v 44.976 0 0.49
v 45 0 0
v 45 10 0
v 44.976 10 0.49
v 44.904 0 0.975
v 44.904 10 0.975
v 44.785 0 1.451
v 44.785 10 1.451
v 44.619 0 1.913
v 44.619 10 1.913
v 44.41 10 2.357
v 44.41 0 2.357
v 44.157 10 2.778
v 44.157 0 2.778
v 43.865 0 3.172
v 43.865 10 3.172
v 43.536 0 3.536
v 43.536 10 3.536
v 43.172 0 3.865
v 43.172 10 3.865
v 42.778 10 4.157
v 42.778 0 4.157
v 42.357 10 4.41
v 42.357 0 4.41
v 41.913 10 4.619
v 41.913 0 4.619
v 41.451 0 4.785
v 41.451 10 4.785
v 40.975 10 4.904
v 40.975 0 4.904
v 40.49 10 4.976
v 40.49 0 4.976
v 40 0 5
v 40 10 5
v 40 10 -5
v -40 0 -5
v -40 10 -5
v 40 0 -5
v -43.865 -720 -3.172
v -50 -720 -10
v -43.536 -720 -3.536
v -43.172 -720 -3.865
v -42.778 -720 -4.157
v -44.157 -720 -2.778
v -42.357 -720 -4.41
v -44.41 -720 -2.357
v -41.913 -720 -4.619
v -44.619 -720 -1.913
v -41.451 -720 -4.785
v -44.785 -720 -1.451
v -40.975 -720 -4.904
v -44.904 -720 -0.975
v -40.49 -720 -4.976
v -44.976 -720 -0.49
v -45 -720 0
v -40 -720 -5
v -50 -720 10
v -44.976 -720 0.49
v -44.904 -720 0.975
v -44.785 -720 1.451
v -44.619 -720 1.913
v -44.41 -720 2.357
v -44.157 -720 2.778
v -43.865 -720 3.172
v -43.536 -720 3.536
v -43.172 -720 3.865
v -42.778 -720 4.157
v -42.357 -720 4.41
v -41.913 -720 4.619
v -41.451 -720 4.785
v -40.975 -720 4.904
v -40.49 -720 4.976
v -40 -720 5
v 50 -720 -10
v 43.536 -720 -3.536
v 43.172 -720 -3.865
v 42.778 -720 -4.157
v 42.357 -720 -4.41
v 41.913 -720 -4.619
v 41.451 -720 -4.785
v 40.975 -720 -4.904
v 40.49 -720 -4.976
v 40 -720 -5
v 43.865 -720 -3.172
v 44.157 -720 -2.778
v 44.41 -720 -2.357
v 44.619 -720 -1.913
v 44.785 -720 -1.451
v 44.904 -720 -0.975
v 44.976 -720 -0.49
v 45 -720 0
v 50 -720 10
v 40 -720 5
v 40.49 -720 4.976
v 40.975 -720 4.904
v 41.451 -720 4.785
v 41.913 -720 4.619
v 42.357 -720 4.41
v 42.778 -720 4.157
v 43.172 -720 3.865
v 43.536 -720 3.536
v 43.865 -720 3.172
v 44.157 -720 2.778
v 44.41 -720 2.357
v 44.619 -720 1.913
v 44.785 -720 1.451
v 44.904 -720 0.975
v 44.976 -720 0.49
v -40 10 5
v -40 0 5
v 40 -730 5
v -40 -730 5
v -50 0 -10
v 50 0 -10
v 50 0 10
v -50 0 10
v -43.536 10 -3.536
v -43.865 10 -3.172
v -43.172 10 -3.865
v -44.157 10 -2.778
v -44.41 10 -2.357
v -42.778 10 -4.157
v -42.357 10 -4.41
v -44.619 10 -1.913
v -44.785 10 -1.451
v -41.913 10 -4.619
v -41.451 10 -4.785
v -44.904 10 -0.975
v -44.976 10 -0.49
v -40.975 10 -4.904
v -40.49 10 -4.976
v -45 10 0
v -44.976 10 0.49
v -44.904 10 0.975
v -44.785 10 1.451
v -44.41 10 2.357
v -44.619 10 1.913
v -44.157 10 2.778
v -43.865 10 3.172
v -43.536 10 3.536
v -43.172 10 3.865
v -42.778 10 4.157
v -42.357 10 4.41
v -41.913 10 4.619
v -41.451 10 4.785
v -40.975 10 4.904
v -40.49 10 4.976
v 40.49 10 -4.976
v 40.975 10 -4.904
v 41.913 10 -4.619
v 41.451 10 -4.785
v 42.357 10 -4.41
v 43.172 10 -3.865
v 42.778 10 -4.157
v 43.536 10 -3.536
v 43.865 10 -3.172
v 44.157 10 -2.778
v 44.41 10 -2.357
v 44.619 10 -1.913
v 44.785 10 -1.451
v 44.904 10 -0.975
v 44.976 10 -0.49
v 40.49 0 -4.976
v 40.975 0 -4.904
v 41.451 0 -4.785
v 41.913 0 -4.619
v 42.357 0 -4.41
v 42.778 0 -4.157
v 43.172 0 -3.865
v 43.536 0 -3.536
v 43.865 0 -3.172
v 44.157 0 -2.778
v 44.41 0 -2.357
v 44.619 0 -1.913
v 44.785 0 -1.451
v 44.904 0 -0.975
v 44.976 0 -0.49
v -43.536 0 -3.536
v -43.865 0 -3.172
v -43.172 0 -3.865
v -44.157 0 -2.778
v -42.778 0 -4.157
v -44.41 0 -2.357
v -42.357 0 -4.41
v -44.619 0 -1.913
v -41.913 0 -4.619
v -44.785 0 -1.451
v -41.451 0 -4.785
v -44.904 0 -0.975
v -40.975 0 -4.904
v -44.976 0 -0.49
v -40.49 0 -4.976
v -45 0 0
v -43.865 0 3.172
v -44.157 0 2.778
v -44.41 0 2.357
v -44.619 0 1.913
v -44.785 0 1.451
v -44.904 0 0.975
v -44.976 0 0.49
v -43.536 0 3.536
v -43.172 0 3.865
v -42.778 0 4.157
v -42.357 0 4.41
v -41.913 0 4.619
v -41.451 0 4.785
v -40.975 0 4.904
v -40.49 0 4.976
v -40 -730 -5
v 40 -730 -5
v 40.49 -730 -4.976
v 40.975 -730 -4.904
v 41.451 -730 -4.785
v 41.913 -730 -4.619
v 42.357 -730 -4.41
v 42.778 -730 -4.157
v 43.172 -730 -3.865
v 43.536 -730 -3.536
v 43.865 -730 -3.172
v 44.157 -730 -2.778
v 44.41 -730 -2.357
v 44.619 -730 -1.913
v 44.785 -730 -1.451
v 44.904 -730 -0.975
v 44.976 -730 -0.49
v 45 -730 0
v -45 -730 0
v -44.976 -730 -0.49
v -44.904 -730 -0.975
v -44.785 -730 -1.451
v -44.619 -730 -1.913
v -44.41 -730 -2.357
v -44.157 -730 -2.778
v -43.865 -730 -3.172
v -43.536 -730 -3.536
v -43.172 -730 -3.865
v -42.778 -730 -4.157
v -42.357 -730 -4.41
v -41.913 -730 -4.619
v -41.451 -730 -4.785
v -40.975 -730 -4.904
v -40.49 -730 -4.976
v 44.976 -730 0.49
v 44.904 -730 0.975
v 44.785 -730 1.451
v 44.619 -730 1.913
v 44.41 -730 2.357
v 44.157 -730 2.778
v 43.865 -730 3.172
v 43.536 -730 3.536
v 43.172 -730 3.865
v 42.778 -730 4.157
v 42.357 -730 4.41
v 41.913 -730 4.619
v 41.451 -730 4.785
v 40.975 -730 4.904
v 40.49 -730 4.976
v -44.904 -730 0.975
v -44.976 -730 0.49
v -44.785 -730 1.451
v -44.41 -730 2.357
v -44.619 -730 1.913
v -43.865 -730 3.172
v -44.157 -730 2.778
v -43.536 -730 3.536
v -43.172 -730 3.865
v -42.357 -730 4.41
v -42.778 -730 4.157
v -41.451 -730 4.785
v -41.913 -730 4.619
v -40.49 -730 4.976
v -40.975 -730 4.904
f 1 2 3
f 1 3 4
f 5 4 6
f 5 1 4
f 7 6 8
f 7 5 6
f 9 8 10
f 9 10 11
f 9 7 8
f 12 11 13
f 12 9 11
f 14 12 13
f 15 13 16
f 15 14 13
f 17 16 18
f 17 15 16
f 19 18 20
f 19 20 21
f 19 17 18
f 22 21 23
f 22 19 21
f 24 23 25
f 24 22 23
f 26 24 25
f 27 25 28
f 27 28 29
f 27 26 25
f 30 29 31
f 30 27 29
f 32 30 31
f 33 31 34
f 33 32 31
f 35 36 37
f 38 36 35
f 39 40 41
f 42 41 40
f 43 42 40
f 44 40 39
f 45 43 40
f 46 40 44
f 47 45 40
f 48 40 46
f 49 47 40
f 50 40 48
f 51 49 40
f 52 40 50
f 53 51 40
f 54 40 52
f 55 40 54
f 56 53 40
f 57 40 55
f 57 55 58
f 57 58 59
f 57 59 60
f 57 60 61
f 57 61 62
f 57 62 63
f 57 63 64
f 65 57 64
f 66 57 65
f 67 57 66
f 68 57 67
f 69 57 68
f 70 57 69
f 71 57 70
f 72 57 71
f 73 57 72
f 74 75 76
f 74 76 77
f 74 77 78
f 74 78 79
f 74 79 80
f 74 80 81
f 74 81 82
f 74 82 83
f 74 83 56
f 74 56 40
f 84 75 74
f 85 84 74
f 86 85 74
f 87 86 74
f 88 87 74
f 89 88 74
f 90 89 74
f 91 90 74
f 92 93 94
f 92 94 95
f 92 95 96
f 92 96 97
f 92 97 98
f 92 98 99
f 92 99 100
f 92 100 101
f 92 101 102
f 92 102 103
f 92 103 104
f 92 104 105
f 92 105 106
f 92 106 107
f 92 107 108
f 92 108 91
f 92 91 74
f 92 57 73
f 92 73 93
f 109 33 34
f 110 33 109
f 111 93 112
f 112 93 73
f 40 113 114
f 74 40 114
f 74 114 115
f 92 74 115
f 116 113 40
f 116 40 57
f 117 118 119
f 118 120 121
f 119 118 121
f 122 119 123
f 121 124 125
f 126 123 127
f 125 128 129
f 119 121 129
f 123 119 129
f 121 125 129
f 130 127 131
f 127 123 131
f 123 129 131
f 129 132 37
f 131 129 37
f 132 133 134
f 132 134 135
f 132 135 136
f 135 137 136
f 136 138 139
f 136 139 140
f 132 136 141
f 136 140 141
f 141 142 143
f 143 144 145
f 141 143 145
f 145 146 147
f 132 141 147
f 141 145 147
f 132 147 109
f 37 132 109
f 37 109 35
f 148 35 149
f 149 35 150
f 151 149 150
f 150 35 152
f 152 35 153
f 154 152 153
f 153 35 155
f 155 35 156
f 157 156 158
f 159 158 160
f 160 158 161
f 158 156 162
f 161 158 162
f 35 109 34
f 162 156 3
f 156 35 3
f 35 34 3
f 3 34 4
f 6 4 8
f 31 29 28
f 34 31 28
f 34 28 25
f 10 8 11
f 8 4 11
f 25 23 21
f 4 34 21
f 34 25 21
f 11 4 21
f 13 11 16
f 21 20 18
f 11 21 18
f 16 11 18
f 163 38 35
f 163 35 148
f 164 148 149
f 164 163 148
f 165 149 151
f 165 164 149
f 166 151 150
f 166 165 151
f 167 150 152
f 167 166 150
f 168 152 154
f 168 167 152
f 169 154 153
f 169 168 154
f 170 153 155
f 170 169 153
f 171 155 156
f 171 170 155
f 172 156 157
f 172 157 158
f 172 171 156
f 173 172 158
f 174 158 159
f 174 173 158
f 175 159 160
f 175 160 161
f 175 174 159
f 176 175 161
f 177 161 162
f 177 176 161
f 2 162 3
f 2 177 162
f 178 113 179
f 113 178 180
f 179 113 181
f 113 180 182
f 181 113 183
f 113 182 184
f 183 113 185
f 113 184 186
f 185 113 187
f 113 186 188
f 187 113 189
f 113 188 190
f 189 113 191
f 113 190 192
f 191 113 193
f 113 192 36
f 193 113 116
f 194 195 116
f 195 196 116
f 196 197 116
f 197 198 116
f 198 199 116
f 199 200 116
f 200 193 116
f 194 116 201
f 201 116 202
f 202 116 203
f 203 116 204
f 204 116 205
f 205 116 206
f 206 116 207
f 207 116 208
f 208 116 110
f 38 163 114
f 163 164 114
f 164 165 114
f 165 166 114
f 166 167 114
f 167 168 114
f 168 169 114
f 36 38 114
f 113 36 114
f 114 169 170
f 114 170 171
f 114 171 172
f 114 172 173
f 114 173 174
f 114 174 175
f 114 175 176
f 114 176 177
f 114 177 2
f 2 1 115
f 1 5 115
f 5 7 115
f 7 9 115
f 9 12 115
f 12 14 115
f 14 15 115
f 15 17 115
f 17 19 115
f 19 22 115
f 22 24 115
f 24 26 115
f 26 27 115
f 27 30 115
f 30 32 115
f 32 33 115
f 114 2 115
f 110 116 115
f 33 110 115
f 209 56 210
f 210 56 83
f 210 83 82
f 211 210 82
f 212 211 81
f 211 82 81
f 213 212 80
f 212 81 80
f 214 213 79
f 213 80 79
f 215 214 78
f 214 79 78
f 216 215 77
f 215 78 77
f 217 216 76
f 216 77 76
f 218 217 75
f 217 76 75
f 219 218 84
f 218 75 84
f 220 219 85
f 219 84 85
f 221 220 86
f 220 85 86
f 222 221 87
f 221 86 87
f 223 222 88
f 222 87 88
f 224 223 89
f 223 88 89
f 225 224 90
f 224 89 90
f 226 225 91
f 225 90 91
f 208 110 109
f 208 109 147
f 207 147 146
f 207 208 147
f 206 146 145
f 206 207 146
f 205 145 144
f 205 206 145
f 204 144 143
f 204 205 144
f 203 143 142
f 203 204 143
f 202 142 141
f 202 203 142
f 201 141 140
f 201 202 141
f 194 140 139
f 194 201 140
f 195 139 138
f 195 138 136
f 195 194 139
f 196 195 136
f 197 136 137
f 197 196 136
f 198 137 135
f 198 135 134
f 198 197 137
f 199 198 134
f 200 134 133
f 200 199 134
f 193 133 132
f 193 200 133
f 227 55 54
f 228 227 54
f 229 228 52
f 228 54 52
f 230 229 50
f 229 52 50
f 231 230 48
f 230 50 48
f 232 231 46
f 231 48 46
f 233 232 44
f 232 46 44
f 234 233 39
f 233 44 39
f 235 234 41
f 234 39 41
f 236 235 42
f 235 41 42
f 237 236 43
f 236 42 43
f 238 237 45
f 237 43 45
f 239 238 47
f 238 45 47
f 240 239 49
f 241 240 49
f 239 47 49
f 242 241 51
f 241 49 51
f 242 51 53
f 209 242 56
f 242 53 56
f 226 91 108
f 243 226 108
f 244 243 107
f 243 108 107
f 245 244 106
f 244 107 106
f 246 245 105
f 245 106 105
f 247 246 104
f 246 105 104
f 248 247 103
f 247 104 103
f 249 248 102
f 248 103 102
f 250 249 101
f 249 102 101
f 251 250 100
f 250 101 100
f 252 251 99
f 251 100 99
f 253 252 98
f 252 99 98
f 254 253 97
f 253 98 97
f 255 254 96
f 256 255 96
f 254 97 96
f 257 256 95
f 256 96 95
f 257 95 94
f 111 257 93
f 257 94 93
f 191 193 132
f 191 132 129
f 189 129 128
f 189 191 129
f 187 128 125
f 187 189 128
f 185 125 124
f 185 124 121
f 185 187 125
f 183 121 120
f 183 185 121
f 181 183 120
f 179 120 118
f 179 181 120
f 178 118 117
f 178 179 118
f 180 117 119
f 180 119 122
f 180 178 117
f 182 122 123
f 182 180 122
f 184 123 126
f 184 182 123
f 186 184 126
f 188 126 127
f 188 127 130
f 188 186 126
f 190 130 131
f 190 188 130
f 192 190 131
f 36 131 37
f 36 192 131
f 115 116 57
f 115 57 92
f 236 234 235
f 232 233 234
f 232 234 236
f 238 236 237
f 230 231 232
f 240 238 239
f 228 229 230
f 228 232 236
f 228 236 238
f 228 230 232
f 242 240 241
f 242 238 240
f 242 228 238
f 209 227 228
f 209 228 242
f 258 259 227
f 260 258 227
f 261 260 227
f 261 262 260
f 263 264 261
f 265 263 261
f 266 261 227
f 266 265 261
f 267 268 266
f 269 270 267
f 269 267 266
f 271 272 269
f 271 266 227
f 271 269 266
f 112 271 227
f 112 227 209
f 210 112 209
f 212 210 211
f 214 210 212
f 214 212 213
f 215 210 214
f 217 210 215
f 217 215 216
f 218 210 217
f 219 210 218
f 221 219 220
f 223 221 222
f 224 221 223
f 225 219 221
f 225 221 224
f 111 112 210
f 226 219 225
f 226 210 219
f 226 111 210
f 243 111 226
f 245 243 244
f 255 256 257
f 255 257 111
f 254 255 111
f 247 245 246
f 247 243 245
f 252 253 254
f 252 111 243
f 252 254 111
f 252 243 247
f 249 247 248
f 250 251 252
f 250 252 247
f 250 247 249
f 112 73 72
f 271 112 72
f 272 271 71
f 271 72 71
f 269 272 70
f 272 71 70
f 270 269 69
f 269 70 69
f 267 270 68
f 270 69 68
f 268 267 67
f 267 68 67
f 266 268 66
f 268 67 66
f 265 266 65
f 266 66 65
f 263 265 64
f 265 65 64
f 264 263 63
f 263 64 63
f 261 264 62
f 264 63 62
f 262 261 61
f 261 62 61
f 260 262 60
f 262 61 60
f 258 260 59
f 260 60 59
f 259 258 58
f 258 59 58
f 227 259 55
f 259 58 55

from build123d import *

# Parameters (mm, degrees)
F0_W     = 100
F0_H     = 20
F1_DEPTH = 720
F2_DEPTH = 10
F3_DEPTH = 730


with BuildPart() as f1:
    # F0 (on Front) → F1 (new body)
    with BuildSketch(Plane.XZ):
        Rectangle(F0_W, F0_H)
        with BuildLine():
            Line((-40, 5), (40, 5))
            ThreePointArc((40, 5), (43.535534, 3.535534), (45, 0))
            ThreePointArc((45, 0), (43.535534, -3.535534), (40, -5))
            Line((40, -5), (-40, -5))
            ThreePointArc((-40, -5), (-43.535534, -3.535534), (-45, 0))
            ThreePointArc((-45, 0), (-43.535534, 3.535534), (-40, 5))
        make_face(mode=Mode.SUBTRACT)
        with BuildLine():
            ThreePointArc((45, 0), (43.535534, 3.535534), (40, 5))
            Line((40, 5), (-40, 5))
            ThreePointArc((-40, 5), (-43.535534, 3.535534), (-45, 0))
            ThreePointArc((-45, 0), (-43.535534, -3.535534), (-40, -5))
            Line((-40, -5), (40, -5))
            ThreePointArc((40, -5), (43.535534, -3.535534), (45, 0))
        make_face()
    extrude(amount=F1_DEPTH)

    # F0 (on Front) → F2 (join)
    with BuildSketch(Plane.XZ):
        with BuildLine():
            ThreePointArc((45, 0), (43.535534, 3.535534), (40, 5))
            Line((40, 5), (-40, 5))
            ThreePointArc((-40, 5), (-43.535534, 3.535534), (-45, 0))
            ThreePointArc((-45, 0), (-43.535534, -3.535534), (-40, -5))
            Line((-40, -5), (40, -5))
            ThreePointArc((40, -5), (43.535534, -3.535534), (45, 0))
        make_face()
    extrude(amount=-F2_DEPTH)

    # F0 (on Front) → F3 (join)
    with BuildSketch(Plane.XZ):
        with BuildLine():
            ThreePointArc((45, 0), (43.535534, 3.535534), (40, 5))
            Line((40, 5), (-40, 5))
            ThreePointArc((-40, 5), (-43.535534, 3.535534), (-45, 0))
            ThreePointArc((-45, 0), (-43.535534, -3.535534), (-40, -5))
            Line((-40, -5), (40, -5))
            ThreePointArc((40, -5), (43.535534, -3.535534), (45, 0))
        make_face()
    extrude(amount=F3_DEPTH)


solid = f1.part
